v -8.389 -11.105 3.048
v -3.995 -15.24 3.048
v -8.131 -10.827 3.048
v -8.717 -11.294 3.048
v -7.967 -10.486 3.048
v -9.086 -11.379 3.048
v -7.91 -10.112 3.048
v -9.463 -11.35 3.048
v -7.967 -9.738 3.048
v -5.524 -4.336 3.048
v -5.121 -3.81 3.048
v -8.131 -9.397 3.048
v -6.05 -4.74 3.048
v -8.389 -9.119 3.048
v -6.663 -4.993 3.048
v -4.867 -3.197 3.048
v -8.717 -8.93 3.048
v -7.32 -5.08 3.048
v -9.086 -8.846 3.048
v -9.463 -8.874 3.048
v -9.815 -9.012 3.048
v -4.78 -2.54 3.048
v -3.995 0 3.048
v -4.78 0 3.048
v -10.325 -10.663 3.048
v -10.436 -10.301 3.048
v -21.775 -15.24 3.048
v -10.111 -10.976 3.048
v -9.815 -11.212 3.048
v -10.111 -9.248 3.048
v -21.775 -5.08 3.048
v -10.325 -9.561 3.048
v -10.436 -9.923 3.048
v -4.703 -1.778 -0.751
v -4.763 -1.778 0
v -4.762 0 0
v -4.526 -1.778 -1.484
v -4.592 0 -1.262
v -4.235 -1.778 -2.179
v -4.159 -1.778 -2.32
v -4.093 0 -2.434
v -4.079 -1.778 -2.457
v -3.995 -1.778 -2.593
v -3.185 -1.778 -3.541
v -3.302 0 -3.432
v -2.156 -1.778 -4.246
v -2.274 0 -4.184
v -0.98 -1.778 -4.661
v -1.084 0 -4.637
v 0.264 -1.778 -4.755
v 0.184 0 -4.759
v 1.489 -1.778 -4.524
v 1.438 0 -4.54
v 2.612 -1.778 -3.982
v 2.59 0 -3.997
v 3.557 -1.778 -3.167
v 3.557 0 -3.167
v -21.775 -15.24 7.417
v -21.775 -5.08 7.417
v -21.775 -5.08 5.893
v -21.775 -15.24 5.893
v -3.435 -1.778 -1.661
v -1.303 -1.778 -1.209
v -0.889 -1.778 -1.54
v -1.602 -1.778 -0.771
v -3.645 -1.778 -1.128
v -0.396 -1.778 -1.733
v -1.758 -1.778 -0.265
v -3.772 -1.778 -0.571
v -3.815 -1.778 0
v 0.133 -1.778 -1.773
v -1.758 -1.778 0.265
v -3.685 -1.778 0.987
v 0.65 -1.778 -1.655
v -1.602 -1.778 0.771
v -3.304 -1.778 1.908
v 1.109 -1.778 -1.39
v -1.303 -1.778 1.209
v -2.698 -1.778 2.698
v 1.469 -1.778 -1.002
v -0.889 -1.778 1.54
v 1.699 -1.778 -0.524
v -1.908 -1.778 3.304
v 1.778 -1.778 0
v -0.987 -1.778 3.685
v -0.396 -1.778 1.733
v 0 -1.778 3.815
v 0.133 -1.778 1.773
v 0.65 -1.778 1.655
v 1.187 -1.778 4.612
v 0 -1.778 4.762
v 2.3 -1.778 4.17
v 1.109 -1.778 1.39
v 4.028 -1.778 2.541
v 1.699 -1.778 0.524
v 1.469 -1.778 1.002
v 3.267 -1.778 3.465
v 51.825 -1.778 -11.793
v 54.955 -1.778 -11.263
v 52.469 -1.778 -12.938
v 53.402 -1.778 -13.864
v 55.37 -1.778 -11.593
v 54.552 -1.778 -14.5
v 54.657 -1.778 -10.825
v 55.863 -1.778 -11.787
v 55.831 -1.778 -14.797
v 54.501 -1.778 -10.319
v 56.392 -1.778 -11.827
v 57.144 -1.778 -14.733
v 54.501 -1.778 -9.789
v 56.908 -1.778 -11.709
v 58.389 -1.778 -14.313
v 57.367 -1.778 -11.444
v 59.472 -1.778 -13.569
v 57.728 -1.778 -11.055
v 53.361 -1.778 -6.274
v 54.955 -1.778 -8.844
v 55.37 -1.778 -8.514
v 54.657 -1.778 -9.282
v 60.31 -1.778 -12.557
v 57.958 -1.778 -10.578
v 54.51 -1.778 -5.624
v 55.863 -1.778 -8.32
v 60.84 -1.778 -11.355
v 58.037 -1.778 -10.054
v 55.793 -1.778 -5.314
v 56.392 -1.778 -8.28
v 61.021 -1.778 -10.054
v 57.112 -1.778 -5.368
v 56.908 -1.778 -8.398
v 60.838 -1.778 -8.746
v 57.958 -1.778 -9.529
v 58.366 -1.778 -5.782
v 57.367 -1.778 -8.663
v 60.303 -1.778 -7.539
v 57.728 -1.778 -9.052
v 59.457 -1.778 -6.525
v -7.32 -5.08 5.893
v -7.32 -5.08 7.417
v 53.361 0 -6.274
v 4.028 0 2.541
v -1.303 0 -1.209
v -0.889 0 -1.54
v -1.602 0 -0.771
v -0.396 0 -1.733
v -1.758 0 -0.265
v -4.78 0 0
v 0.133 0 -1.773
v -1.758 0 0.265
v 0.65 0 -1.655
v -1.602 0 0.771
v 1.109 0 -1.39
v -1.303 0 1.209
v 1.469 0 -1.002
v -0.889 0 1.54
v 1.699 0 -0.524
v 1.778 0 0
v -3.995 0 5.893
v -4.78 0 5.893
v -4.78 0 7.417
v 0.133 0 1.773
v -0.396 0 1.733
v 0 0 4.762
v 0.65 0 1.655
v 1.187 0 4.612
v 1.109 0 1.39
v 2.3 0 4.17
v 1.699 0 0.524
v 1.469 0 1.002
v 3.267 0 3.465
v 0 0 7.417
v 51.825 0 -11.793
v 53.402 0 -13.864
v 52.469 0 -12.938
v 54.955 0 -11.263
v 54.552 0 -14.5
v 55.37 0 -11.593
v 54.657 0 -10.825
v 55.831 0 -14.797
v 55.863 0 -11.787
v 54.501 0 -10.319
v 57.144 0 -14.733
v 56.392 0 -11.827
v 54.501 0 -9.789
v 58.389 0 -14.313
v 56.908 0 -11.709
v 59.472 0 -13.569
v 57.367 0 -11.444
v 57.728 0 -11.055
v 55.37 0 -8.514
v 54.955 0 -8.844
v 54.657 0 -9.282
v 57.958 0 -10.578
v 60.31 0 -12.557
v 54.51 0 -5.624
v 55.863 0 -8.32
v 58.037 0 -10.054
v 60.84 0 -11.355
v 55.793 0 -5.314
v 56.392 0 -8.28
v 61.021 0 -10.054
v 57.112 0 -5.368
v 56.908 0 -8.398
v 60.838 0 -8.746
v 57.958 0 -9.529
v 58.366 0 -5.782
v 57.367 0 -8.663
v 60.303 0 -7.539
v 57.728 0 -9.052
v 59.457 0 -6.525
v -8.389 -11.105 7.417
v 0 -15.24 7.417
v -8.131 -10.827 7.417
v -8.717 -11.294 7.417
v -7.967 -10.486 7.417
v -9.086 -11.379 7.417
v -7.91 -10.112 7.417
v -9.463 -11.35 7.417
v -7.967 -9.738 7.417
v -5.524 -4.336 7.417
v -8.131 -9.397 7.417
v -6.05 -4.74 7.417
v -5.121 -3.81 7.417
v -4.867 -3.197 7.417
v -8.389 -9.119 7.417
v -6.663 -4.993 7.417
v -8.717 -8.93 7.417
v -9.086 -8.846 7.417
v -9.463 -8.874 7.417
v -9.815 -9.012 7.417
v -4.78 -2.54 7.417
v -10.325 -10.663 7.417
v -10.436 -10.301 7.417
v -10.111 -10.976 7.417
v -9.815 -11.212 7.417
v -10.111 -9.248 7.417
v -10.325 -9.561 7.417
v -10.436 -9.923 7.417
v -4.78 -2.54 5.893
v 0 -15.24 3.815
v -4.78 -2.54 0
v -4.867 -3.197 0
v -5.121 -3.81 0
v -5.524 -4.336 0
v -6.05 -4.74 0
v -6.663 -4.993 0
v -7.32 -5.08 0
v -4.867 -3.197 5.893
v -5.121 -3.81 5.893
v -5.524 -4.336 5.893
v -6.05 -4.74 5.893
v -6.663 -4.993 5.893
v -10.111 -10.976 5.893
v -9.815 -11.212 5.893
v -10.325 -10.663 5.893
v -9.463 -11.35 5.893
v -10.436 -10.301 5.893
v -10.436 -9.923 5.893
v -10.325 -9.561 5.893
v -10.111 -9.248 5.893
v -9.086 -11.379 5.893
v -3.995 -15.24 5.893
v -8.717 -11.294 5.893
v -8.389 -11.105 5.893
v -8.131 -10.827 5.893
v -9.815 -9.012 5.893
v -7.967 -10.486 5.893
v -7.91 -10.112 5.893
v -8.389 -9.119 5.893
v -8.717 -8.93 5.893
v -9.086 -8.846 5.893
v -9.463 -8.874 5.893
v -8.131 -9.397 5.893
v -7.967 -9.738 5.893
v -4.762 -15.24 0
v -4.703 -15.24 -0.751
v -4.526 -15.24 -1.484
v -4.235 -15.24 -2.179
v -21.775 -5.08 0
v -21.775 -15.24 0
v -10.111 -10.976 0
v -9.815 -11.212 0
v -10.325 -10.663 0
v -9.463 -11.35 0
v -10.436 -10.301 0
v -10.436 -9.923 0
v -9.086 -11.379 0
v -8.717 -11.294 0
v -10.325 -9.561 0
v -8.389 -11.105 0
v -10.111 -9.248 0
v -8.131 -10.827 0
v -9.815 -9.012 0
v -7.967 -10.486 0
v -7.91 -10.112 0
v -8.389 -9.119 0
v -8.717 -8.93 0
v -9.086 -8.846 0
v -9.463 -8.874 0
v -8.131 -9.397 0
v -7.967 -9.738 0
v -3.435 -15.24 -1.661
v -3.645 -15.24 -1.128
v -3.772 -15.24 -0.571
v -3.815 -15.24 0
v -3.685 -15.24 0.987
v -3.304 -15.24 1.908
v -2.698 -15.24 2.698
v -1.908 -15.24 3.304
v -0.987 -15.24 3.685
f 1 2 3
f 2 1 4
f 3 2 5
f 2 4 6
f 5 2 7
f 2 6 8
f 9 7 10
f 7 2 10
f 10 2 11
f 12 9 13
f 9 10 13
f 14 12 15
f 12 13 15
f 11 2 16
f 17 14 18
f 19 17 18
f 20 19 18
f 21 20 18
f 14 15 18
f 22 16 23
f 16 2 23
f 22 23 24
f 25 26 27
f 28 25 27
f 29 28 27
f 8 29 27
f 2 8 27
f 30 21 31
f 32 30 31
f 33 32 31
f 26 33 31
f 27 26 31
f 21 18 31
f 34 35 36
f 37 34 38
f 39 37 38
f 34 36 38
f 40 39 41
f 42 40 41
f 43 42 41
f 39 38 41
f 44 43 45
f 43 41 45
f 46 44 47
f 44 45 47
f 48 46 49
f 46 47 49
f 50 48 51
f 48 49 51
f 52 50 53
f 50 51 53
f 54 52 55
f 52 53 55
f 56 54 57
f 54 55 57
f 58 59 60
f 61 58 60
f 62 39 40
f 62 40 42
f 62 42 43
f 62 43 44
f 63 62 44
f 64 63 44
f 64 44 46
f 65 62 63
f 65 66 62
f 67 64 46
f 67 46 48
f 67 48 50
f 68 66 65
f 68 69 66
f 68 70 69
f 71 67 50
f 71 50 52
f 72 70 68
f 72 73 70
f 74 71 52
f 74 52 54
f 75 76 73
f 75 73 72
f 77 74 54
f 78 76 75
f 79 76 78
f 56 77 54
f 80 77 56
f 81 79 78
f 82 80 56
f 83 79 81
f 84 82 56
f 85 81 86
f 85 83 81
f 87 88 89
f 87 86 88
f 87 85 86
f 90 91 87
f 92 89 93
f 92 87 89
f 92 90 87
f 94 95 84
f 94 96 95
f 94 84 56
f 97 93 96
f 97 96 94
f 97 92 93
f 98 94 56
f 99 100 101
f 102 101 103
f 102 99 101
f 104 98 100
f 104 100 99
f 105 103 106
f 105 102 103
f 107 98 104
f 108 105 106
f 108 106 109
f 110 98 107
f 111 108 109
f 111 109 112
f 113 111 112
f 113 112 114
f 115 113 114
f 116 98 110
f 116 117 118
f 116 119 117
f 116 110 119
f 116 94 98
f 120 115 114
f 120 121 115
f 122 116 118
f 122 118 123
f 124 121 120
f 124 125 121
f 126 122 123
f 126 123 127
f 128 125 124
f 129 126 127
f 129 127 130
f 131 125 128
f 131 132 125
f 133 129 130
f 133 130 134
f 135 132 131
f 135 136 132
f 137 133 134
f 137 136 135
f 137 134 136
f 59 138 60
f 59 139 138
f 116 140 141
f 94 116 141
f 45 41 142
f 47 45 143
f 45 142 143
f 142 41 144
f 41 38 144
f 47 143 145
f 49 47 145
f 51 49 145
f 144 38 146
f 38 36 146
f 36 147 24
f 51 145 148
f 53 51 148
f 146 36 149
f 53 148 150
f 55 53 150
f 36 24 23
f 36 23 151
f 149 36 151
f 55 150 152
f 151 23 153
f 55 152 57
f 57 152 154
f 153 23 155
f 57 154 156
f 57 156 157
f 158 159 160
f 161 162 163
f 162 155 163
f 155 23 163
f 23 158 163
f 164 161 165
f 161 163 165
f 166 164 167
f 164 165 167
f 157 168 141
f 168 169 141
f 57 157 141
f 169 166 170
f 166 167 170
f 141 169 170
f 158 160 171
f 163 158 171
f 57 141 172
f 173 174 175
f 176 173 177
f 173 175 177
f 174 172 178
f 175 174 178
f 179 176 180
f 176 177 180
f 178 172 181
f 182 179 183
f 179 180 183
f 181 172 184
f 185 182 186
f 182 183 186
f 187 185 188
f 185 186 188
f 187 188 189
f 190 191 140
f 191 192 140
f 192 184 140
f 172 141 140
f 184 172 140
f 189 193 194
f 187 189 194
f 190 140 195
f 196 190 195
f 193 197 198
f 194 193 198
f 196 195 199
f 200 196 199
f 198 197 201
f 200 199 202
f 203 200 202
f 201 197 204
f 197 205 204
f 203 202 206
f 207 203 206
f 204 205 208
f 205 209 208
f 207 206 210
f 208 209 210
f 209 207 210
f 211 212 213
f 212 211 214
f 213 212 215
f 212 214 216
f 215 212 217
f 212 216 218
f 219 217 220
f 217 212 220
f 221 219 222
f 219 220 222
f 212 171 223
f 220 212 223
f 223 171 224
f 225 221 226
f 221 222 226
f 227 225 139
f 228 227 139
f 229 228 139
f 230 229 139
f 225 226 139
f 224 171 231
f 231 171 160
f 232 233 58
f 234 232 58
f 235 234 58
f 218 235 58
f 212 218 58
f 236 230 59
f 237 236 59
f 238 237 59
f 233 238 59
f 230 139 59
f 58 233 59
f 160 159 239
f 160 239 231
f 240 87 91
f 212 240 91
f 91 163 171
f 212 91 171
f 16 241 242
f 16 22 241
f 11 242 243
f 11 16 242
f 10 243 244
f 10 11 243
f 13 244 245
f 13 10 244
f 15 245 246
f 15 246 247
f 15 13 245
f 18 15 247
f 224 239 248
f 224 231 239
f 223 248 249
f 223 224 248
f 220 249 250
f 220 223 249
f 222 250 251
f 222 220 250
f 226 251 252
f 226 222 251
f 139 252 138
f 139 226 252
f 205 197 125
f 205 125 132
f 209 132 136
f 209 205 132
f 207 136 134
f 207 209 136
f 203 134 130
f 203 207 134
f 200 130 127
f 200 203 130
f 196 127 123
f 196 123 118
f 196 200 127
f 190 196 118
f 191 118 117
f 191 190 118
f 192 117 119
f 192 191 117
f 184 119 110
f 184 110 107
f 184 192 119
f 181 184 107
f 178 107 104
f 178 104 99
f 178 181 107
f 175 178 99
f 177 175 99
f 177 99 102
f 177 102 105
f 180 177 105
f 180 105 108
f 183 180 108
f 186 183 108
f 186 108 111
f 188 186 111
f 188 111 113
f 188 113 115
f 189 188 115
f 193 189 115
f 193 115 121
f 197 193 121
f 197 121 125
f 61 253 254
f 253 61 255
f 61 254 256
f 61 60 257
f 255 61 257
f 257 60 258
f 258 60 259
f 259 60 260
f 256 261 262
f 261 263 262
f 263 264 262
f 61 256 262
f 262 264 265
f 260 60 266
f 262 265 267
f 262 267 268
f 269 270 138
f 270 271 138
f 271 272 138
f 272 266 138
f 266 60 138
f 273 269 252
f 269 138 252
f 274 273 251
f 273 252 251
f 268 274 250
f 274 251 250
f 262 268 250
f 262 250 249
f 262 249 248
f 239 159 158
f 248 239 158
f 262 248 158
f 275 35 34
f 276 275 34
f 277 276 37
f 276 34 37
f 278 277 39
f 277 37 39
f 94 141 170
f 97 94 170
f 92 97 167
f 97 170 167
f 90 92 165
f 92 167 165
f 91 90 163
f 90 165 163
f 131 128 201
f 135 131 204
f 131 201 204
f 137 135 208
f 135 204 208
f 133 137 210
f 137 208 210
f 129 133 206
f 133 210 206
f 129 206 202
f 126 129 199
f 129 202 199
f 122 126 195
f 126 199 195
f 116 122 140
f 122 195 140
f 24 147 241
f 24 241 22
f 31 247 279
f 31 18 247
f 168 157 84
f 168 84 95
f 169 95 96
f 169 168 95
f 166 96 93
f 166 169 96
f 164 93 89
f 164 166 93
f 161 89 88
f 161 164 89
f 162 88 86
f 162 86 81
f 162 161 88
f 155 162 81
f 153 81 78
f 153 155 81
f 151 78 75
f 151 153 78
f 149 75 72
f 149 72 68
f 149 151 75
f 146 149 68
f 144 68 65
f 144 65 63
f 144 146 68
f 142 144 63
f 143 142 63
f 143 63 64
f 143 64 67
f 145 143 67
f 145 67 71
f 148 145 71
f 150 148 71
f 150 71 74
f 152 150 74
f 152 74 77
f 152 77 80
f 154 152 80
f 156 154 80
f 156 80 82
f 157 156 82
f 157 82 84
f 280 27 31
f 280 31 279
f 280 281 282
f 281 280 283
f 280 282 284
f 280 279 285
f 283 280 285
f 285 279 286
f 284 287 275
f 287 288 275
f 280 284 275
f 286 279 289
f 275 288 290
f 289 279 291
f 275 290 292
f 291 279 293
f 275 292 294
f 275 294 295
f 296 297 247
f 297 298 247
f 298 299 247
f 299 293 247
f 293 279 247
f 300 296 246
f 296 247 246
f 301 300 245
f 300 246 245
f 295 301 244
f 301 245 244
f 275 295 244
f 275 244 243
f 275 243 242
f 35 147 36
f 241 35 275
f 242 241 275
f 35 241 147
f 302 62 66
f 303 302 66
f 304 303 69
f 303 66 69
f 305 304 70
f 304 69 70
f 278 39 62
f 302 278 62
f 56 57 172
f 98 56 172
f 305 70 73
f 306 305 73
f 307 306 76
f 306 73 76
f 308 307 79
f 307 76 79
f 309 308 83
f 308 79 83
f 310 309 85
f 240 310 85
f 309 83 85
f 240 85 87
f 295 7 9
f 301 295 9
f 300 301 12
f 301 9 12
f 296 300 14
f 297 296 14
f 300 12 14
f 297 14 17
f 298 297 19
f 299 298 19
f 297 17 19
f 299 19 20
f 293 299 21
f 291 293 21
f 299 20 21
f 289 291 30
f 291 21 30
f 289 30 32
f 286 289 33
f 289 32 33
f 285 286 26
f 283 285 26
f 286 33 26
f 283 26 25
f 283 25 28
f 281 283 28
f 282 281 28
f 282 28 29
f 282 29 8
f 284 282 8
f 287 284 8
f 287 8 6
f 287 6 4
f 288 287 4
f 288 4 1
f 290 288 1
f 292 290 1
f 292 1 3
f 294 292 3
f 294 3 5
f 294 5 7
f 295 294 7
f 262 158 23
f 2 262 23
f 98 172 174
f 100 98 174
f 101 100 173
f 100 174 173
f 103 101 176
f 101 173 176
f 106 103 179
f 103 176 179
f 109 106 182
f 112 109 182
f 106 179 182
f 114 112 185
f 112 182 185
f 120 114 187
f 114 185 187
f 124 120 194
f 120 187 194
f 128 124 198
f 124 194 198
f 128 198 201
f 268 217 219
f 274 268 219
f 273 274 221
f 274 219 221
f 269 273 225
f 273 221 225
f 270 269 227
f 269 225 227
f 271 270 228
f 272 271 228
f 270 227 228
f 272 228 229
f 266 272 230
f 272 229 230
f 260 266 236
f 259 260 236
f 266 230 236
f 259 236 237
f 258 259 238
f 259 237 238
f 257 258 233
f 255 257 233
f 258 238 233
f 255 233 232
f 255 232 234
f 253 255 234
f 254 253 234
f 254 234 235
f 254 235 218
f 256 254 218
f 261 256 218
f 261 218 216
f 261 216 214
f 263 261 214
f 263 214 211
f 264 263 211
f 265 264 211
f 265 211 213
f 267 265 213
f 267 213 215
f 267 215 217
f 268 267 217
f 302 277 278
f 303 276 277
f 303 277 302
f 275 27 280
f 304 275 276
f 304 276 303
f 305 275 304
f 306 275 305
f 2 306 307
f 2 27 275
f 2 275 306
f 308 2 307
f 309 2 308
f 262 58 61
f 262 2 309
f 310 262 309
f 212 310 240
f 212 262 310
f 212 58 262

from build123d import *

# Parameters (mm, degrees)
F0_R      = 1.778
F1_DEPTH  = 17.78
F3_R      = 1.778
F4_DEPTH  = 16.002
F2_R      = 1.27
F5_DEPTH  = 25.4
F7_DEPTH  = 2.54
F8_W      = 16.9942029752
F8_H      = 1.524
F8_H_2    = 3.048
F9_DEPTH  = 5.08
F11_DEPTH = 13.462
F12_R     = 2.54


# Not quite as in the source:
# - a feature names something its author has since deleted; it is built from what else it names


with BuildPart() as f1:
    # F0 (on Front) → F1 (new body)
    with BuildSketch(Plane.XZ):
        with BuildLine():
            Line((-21.7745867558, 0), (-5.7350052521, 0))
            Line((-5.7350052521, 0), (-4.7625, 0))
            ThreePointArc((-4.7625, 0), (-3.3675960454, 3.3675960454), (0, 4.7625))
            Line((0, 4.7625), (0, 7.4168))
            Line((0, 7.4168), (-21.7745867558, 7.4168))
            Line((-21.7745867558, 7.4168), (-21.7745867558, 5.8928))
            Line((-21.7745867558, 5.8928), (-3.9945867558, 5.8928))
            Line((-3.9945867558, 5.8928), (-3.9945867558, 3.048))
            Line((-3.9945867558, 3.048), (-21.7745867558, 3.048))
            Line((-21.7745867558, 3.048), (-21.7745867558, 0))
        make_face()
        with BuildLine():
            ThreePointArc((4.7625, 0), (4.4508557537, -1.6944879196), (3.5567092138, -3.1672110474))
            Line((3.5567092138, -3.1672110474), (51.8252535905, -11.7928625561))
            ThreePointArc((51.8252535905, -11.7928625561), (51.6705317006, -8.7770103), (53.3605608921, -6.2743906673))
            Line((53.3605608921, -6.2743906673), (4.0277059432, 2.5414545216))
            ThreePointArc((4.0277059432, 2.5414545216), (4.5751150698, 1.3227729767), (4.7625, 0))
        make_face()
        with BuildLine():
            ThreePointArc((0, 4.7625), (-3.3675960454, 3.3675960454), (-4.7625, 0))
            ThreePointArc((-4.7625, 0), (-1.6944879196, -4.4508557537), (3.5567092138, -3.1672110474))
            ThreePointArc((3.5567092138, -3.1672110474), (4.4508557537, -1.6944879196), (4.7625, 0))
            ThreePointArc((4.7625, 0), (4.5751150698, 1.3227729767), (4.0277059432, 2.5414545216))
            ThreePointArc((4.0277059432, 2.5414545216), (2.2997531488, 4.1704366324), (0, 4.7625))
        make_face()
        Circle(F0_R, mode=Mode.SUBTRACT)
        with BuildLine():
            ThreePointArc((53.3605608921, -6.2743906673), (51.6705317006, -8.7770103), (51.8252535905, -11.7928625561))
            ThreePointArc((51.8252535905, -11.7928625561), (57.1438640566, -14.7330470759), (61.0212711223, -10.0535153956))
            ThreePointArc((61.0212711223, -10.0535153956), (58.3657452594, -5.7824422007), (53.3605608921, -6.2743906673))
        make_face()
        with Locations((56.2587711223, -10.0535153956)):
            Circle(F0_R, mode=Mode.SUBTRACT)
    extrude(amount=F1_DEPTH)

    # F3 (on face) → F4 (cut)
    with BuildSketch(Plane.XZ.offset(17.78)):
        with BuildLine():
            ThreePointArc((4.0277059432, 2.5414545216), (2.2997531488, 4.1704366324), (0, 4.7625))
            ThreePointArc((0, 4.7625), (-3.3675960454, 3.3675960454), (-4.7625, 0))
            ThreePointArc((-4.7625, 0), (-4.5665768899, -1.3519547915), (-3.994927608, -2.5926742288))
            ThreePointArc((-3.994927608, -2.5926742288), (-0.3612920968, -4.7487760813), (3.5567092138, -3.1672110474))
            Line((3.5567092138, -3.1672110474), (51.8252535905, -11.7928625561))
            ThreePointArc((51.8252535905, -11.7928625561), (60.847010544, -11.3300204911), (53.3605608921, -6.2743906673))
            Line((53.3605608921, -6.2743906673), (4.0277059432, 2.5414545216))
        make_face()
        with Locations((56.2587711223, -10.0535153956)):
            Circle(F3_R, mode=Mode.SUBTRACT)
        Circle(F3_R, mode=Mode.SUBTRACT)
    extrude(amount=-F4_DEPTH, mode=Mode.SUBTRACT)

    # F2 (on face) → F5 (cut)
    with BuildSketch(Plane.XY.offset(7.4168)):
        with Locations((-9.1804936528, -10.1120751351)):
            Circle(F2_R)
    extrude(amount=-F5_DEPTH, mode=Mode.SUBTRACT)

    # F6 (on face) → F7 (cut)
    with BuildSketch(Plane.XZ.offset(17.78)):
        with BuildLine():
            Line((-21.7745867558, 0), (-4.7625, 0))
            ThreePointArc((-4.7625, 0), (-3.3675960454, 3.3675960454), (0, 4.7625))
            Line((0, 4.7625), (0, 7.4168))
            Line((0, 7.4168), (-21.7745867558, 7.4168))
            Line((-21.7745867558, 7.4168), (-21.7745867558, 5.8928))
            Line((-21.7745867558, 5.8928), (-3.9945867558, 5.8928))
            Line((-3.9945867558, 5.8928), (-3.9945867558, 3.048))
            Line((-3.9945867558, 3.048), (-21.7745867558, 3.048))
            Line((-21.7745867558, 3.048), (-21.7745867558, 0))
        make_face()
    extrude(amount=-F7_DEPTH, mode=Mode.SUBTRACT)

    # F8 (on face) → F9 (cut)
    with BuildSketch(Plane(origin=(0, 0, 0), x_dir=(-1, 0, 0), z_dir=(0, 1, 0))):
        with Locations((13.2774852682, 6.6548)):
            Rectangle(F8_W, F8_H)
        with Locations((13.2774852682, 1.524)):
            Rectangle(F8_W, F8_H_2)
    extrude(amount=-F9_DEPTH, mode=Mode.SUBTRACT)

    # F10 (on face) → F11 (join, through all)
    with BuildSketch(Plane.XZ.offset(1.778)):
        with BuildLine():
            ThreePointArc((-3.8153238056, 0), (-2.6978413354, 2.6978413354), (0, 3.8153238056))
            Line((0, 3.8153238056), (0, 4.7625))
            ThreePointArc((0, 4.7625), (-3.3675960454, 3.3675960454), (-4.7625, 0))
            Line((-4.7625, 0), (-3.8153238056, 0))
        make_face()
        with BuildLine():
            Line((-4.2348116803, -2.1789392561), (-3.434889127, -1.6607927104))
            ThreePointArc((-3.434889127, -1.6607927104), (-3.7189991932, -0.8519041865), (-3.8153238056, 0))
            Line((-3.8153238056, 0), (-4.7625, 0))
            ThreePointArc((-4.7625, 0), (-4.6286983525, -1.1209628946), (-4.2348116803, -2.1789392561))
        make_face()
    extrude(amount=F11_DEPTH)

    # F12
    f12_edges = [f1.edges().sort_by_distance(p)[0] for p in [
        (-4.780384, -5.08, 1.524),
        (-4.780384, -5.08, 6.6548),
    ]]
    fillet(f12_edges, radius=F12_R)


solid = f1.part
